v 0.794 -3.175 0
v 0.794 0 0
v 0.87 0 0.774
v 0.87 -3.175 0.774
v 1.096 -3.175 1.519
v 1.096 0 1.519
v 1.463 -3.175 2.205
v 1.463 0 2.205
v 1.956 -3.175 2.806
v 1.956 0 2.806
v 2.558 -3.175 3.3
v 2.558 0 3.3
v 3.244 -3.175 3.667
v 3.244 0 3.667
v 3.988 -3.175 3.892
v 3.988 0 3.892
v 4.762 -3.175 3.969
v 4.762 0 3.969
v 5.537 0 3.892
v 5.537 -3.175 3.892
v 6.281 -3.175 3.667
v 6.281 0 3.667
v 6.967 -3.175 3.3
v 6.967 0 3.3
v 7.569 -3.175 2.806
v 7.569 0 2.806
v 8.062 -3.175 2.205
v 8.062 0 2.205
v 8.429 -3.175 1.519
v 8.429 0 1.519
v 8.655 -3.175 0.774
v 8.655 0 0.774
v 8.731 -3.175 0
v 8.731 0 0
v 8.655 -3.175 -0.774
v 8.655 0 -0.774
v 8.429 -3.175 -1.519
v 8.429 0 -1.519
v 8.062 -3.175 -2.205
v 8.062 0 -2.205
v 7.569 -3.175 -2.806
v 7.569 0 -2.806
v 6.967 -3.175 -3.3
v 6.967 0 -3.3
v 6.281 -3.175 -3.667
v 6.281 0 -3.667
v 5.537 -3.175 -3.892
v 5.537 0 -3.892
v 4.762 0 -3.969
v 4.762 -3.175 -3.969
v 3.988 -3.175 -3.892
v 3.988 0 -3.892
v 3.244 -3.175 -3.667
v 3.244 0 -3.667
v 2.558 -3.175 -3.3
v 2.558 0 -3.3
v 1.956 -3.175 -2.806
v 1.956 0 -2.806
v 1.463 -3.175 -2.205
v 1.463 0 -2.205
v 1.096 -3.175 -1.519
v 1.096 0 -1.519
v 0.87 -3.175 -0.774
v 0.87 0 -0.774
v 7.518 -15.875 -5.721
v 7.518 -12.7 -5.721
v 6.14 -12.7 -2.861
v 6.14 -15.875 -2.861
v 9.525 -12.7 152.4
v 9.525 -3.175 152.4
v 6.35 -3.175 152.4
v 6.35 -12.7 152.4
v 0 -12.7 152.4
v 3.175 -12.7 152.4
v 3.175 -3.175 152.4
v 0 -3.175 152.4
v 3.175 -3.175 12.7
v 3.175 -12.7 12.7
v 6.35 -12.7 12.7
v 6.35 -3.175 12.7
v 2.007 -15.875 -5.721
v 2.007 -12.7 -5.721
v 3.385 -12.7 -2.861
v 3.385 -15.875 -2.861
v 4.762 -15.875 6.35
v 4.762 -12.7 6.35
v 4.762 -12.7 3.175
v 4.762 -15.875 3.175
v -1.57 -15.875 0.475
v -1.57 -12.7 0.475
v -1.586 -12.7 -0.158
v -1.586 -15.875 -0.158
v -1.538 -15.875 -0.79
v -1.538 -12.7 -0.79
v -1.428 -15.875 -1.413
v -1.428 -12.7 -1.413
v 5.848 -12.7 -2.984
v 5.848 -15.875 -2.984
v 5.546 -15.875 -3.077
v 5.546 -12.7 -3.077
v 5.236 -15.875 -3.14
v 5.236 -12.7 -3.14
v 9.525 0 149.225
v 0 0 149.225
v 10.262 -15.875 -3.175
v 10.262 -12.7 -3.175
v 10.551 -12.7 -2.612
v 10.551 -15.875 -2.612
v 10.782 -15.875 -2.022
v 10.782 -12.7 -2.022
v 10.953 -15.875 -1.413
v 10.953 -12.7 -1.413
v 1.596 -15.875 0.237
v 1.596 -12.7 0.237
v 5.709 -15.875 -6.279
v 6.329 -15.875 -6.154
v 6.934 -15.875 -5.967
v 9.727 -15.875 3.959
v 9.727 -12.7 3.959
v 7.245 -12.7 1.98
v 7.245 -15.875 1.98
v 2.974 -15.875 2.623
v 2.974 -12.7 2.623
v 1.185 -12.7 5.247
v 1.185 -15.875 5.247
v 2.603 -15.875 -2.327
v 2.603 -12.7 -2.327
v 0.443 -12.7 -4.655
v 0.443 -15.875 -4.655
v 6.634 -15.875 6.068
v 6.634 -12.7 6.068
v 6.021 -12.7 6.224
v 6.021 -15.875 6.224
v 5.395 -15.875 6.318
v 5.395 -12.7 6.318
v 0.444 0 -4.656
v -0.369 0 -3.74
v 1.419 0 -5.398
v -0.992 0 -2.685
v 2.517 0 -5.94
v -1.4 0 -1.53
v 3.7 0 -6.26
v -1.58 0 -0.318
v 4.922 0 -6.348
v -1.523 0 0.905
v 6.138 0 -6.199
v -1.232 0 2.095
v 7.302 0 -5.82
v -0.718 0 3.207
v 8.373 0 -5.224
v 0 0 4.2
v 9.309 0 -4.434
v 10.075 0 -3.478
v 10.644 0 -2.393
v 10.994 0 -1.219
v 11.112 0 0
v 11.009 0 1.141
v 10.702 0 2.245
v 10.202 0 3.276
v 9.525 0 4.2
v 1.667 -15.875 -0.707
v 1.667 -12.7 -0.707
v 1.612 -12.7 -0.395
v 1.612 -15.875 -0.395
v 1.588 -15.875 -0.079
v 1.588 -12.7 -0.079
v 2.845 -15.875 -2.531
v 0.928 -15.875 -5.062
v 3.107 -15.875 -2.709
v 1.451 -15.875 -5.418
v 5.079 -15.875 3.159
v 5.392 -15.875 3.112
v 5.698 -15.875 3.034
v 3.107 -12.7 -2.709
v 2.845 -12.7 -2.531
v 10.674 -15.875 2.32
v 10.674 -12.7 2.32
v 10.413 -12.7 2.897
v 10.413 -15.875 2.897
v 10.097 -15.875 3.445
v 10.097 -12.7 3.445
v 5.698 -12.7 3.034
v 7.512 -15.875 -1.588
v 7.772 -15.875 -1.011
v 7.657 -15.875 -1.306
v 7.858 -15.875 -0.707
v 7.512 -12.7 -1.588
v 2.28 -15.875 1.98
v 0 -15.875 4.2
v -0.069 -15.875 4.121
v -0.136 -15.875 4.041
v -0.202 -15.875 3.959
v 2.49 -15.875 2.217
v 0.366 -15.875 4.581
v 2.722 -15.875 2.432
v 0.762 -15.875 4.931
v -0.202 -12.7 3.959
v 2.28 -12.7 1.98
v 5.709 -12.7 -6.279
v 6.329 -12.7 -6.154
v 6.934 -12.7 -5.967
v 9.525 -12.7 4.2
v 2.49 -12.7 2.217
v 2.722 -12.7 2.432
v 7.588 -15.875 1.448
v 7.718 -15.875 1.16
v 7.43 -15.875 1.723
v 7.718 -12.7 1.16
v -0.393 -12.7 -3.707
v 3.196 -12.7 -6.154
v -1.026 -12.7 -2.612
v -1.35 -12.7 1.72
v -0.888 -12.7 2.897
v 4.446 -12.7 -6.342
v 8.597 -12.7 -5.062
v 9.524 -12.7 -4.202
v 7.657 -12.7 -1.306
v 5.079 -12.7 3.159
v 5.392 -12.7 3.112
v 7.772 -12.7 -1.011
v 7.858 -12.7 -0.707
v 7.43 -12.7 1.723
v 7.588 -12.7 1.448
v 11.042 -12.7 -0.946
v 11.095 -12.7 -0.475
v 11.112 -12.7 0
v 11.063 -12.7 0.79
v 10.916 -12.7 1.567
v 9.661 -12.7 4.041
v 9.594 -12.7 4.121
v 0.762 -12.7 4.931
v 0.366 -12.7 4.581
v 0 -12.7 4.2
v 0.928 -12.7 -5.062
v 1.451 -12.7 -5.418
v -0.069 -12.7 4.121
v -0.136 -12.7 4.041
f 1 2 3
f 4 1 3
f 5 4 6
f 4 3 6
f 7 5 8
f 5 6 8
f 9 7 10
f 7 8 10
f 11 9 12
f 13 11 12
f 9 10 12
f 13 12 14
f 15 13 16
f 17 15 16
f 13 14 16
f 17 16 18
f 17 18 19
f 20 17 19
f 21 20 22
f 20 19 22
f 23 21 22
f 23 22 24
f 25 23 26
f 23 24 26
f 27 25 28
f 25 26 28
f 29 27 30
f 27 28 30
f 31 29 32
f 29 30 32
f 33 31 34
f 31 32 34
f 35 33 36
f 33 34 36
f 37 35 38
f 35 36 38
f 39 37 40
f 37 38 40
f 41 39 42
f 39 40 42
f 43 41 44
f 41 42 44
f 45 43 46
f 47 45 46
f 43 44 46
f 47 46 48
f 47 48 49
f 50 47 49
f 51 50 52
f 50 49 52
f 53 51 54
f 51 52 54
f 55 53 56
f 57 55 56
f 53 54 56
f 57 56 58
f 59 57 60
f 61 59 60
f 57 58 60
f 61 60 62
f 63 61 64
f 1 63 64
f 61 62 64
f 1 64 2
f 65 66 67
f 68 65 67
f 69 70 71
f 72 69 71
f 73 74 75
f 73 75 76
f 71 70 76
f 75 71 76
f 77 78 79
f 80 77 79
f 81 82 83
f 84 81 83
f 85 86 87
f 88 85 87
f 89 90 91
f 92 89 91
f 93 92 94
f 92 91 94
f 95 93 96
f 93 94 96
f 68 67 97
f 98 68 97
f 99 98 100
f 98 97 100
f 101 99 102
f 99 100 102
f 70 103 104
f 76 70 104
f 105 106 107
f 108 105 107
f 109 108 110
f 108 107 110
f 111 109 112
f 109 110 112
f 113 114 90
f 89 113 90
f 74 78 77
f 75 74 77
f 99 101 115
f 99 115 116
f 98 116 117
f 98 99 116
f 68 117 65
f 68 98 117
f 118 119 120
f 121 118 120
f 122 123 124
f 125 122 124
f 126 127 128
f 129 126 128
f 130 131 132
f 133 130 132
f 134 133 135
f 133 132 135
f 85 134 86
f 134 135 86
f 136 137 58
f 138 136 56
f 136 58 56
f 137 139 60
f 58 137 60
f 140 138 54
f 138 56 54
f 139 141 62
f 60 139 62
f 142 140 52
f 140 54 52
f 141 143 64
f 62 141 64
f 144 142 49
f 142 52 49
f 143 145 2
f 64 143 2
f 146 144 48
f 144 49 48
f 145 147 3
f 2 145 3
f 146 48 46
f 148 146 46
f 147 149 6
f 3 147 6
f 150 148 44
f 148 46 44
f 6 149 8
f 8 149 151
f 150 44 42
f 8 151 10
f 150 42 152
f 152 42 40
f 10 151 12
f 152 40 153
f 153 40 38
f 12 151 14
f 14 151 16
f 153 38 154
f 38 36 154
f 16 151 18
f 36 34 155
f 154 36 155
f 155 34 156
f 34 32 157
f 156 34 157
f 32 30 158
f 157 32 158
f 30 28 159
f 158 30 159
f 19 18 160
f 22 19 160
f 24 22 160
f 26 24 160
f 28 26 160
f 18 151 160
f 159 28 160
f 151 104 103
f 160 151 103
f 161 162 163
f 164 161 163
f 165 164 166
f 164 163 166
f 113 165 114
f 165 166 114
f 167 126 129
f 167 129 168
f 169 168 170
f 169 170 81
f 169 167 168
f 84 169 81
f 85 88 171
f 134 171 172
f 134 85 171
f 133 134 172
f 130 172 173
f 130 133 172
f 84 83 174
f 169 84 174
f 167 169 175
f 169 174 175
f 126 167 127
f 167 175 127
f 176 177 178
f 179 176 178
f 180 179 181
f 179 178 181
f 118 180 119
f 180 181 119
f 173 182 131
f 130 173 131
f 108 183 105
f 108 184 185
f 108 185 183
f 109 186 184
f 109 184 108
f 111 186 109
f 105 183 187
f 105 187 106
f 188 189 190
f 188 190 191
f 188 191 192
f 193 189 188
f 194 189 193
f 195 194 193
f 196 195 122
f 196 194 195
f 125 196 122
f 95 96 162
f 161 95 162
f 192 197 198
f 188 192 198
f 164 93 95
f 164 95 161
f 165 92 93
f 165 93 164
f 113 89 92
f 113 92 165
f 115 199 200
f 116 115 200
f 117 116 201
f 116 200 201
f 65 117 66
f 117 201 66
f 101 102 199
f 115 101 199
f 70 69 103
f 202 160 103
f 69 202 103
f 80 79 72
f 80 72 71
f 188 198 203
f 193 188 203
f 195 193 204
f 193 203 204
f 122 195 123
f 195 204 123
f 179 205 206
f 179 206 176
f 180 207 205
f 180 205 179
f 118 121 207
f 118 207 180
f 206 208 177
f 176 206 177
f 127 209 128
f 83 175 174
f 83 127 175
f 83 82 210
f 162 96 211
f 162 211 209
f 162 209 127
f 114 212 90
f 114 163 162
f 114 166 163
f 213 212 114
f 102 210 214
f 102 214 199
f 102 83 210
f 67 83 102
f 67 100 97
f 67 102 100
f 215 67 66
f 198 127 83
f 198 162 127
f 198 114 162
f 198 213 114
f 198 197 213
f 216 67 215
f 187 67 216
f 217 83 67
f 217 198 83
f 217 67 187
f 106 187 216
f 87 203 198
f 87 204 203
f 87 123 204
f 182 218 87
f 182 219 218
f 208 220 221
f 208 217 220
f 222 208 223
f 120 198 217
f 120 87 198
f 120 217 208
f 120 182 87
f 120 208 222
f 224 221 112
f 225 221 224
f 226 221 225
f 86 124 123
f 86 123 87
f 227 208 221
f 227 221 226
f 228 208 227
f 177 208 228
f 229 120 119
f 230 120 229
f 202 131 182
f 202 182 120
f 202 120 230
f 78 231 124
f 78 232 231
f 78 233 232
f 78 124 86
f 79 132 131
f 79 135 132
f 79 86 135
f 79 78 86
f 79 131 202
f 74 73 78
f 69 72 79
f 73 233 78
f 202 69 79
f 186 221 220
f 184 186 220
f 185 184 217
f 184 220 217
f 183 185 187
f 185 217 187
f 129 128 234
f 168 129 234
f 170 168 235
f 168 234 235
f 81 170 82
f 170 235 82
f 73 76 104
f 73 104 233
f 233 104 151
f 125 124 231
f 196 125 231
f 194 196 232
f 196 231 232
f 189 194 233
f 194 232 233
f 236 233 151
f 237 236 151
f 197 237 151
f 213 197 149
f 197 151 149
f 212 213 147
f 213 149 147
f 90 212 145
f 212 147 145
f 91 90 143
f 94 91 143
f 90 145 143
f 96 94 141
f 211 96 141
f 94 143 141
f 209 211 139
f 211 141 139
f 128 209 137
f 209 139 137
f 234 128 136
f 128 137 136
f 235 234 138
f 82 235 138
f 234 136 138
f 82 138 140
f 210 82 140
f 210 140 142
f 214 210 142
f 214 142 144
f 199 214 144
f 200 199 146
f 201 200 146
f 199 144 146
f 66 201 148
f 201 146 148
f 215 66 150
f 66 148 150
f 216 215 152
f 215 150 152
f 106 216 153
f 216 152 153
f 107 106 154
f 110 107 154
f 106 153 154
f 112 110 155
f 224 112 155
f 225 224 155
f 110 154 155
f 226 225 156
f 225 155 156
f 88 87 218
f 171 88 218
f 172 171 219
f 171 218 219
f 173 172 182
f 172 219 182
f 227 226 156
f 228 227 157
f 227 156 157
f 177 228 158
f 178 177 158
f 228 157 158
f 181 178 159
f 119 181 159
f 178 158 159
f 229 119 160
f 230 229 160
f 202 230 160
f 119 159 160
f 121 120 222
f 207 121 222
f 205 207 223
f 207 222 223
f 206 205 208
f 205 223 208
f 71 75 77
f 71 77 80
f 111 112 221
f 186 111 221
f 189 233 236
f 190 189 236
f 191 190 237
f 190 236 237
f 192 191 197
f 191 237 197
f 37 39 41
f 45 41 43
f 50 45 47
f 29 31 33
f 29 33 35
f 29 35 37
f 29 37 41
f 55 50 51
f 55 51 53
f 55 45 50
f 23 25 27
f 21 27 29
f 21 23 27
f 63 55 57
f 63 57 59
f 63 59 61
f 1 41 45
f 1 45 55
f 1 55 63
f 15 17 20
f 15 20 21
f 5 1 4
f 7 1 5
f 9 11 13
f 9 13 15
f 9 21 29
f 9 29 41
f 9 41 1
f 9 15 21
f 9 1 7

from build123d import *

# Parameters (mm, degrees)
F1_DEPTH = 12.7
F2_W     = 3.175
F2_H     = 9.525
F3_DEPTH = 139.7
F5_DEPTH = 3.175
F6_R     = 3.96875
F7_DEPTH = 3.175
F8_SIZE  = 3.17499


# Not quite as in the source:
# - a fillet or chamfer is up to 0.001 mm smaller than in the source, because OpenCascade refuses the exact size


with BuildPart() as f1:
    # F0 (on Front) → F1 (new body)
    with BuildSketch(Plane.XZ):
        with BuildLine():
            Line((0, 152.4), (0, 4.2001302063))
            ThreePointArc((0, 4.2001302063), (4.7625, 6.35), (9.525, 4.2001302063))
            Line((9.525, 4.2001302063), (9.525, 152.4))
            Line((9.525, 152.4), (0, 152.4))
        make_face()
        with BuildLine():
            Line((0, 4.2001302063), (0, 0))
            Line((0, 0), (9.525, 0))
            Line((9.525, 0), (9.525, 4.2001302063))
            ThreePointArc((9.525, 4.2001302063), (4.7625, 6.35), (0, 4.2001302063))
        make_face()
        with BuildLine():
            Line((9.525, 0), (0, 0))
            Line((0, 0), (0, 4.2001302063))
            ThreePointArc((0, 4.2001302063), (2.5174359697, -5.9398811015), (11.1125, 0))
            ThreePointArc((11.1125, 0), (10.7023811015, 2.2450640303), (9.525, 4.2001302063))
            Line((9.525, 4.2001302063), (9.525, 0))
        make_face()
    extrude(amount=F1_DEPTH)

    # F2 (on face) → F3 (cut)
    with BuildSketch(Plane.XY.offset(152.4)):
        with Locations((4.7625, -7.9375)):
            Rectangle(F2_W, F2_H)
    extrude(amount=-F3_DEPTH, mode=Mode.SUBTRACT)

    # F4 (on face) → F5 (join)
    with BuildSketch(Plane.XZ.offset(12.7)):
        with BuildLine():
            Line((5.2357091951, -3.1395378733), (5.7089183902, -6.2790757465))
            ThreePointArc((5.7089183902, -6.2790757465), (6.6341953575, -6.0678873167), (7.5176617434, -5.7211523112))
            Line((7.5176617434, -5.7211523112), (6.1400808717, -2.8605761556))
            ThreePointArc((6.1400808717, -2.8605761556), (5.6983476788, -3.0339436584), (5.2357091951, -3.1395378733))
        make_face()
        with BuildLine():
            Line((2.6029515576, -2.3274396931), (0.4434031152, -4.6548793861))
            ThreePointArc((0.4434031152, -4.6548793861), (1.1854176313, -5.2466162169), (2.0073382566, -5.7211523112))
            Line((2.0073382566, -5.7211523112), (3.3849191283, -2.8605761556))
            ThreePointArc((3.3849191283, -2.8605761556), (2.9739588156, -2.6233081085), (2.6029515576, -2.3274396931))
        make_face()
        with BuildLine():
            Line((1.5963779439, 0.2372680471), (-1.5697441121, 0.4745360943))
            ThreePointArc((-1.5697441121, 0.4745360943), (-1.5697441121, -0.4745360943), (-1.4282922424, -1.4130079306))
            Line((-1.4282922424, -1.4130079306), (1.6671038788, -0.7065039653))
            ThreePointArc((1.6671038788, -0.7065039653), (1.5963779439, -0.2372680471), (1.5963779439, 0.2372680471))
        make_face()
        with BuildLine():
            ThreePointArc((2.2801850432, 1.9795801209), (2.6029515576, 2.3274396931), (2.9739588156, 2.6233081085))
            Line((2.9739588156, 2.6233081085), (1.1854176313, 5.2466162169))
            ThreePointArc((1.1854176313, 5.2466162169), (0.5600076724, 4.760415763), (0, 4.2001302063))
            ThreePointArc((0, 4.2001302063), (-0.1025571138, 4.080896872), (-0.2021299137, 3.9591602418))
            Line((-0.2021299137, 3.9591602418), (2.2801850432, 1.9795801209))
        make_face()
        with BuildLine():
            Line((4.7625, 6.35), (4.7625, 3.175))
            ThreePointArc((4.7625, 3.175), (5.2357091951, 3.1395378733), (5.6983476788, 3.0339436584))
            Line((5.6983476788, 3.0339436584), (6.6341953575, 6.0678873167))
            ThreePointArc((6.6341953575, 6.0678873167), (5.7089183902, 6.2790757465), (4.7625, 6.35))
        make_face()
        with BuildLine():
            ThreePointArc((10.6735483039, 2.3199155047), (10.261761314, 3.175), (9.7271299137, 3.9591602418))
            Line((9.7271299137, 3.9591602418), (7.2448149568, 1.9795801209))
            ThreePointArc((7.2448149568, 1.9795801209), (7.512130657, 1.5875), (7.7180241519, 1.1599577524))
            Line((7.7180241519, 1.1599577524), (10.6735483039, 2.3199155047))
        make_face()
        with BuildLine():
            Line((7.512130657, -1.5875), (10.261761314, -3.175))
            ThreePointArc((10.261761314, -3.175), (10.6735483039, -2.3199155047), (10.9532922424, -1.4130079306))
            Line((10.9532922424, -1.4130079306), (7.8578961212, -0.7065039653))
            ThreePointArc((7.8578961212, -0.7065039653), (7.7180241519, -1.1599577524), (7.512130657, -1.5875))
        make_face()
    extrude(amount=F5_DEPTH)

    # F6 (on face) → F7 (cut)
    with BuildSketch(Plane(origin=(0, 0, 0), x_dir=(-1, 0, 0), z_dir=(0, 1, 0))):
        with Locations((-4.7625, 0)):
            Circle(F6_R)
    extrude(amount=-F7_DEPTH, mode=Mode.SUBTRACT)

    # F8 (size 3.175 in the source; OpenCascade refuses exactly that, so slightly less here)
    f8_edges = [f1.edges().sort_by_distance(p)[0] for p in [
        (4.7625, 0, 152.4),
    ]]
    chamfer(f8_edges, length=F8_SIZE)


solid = f1.part
